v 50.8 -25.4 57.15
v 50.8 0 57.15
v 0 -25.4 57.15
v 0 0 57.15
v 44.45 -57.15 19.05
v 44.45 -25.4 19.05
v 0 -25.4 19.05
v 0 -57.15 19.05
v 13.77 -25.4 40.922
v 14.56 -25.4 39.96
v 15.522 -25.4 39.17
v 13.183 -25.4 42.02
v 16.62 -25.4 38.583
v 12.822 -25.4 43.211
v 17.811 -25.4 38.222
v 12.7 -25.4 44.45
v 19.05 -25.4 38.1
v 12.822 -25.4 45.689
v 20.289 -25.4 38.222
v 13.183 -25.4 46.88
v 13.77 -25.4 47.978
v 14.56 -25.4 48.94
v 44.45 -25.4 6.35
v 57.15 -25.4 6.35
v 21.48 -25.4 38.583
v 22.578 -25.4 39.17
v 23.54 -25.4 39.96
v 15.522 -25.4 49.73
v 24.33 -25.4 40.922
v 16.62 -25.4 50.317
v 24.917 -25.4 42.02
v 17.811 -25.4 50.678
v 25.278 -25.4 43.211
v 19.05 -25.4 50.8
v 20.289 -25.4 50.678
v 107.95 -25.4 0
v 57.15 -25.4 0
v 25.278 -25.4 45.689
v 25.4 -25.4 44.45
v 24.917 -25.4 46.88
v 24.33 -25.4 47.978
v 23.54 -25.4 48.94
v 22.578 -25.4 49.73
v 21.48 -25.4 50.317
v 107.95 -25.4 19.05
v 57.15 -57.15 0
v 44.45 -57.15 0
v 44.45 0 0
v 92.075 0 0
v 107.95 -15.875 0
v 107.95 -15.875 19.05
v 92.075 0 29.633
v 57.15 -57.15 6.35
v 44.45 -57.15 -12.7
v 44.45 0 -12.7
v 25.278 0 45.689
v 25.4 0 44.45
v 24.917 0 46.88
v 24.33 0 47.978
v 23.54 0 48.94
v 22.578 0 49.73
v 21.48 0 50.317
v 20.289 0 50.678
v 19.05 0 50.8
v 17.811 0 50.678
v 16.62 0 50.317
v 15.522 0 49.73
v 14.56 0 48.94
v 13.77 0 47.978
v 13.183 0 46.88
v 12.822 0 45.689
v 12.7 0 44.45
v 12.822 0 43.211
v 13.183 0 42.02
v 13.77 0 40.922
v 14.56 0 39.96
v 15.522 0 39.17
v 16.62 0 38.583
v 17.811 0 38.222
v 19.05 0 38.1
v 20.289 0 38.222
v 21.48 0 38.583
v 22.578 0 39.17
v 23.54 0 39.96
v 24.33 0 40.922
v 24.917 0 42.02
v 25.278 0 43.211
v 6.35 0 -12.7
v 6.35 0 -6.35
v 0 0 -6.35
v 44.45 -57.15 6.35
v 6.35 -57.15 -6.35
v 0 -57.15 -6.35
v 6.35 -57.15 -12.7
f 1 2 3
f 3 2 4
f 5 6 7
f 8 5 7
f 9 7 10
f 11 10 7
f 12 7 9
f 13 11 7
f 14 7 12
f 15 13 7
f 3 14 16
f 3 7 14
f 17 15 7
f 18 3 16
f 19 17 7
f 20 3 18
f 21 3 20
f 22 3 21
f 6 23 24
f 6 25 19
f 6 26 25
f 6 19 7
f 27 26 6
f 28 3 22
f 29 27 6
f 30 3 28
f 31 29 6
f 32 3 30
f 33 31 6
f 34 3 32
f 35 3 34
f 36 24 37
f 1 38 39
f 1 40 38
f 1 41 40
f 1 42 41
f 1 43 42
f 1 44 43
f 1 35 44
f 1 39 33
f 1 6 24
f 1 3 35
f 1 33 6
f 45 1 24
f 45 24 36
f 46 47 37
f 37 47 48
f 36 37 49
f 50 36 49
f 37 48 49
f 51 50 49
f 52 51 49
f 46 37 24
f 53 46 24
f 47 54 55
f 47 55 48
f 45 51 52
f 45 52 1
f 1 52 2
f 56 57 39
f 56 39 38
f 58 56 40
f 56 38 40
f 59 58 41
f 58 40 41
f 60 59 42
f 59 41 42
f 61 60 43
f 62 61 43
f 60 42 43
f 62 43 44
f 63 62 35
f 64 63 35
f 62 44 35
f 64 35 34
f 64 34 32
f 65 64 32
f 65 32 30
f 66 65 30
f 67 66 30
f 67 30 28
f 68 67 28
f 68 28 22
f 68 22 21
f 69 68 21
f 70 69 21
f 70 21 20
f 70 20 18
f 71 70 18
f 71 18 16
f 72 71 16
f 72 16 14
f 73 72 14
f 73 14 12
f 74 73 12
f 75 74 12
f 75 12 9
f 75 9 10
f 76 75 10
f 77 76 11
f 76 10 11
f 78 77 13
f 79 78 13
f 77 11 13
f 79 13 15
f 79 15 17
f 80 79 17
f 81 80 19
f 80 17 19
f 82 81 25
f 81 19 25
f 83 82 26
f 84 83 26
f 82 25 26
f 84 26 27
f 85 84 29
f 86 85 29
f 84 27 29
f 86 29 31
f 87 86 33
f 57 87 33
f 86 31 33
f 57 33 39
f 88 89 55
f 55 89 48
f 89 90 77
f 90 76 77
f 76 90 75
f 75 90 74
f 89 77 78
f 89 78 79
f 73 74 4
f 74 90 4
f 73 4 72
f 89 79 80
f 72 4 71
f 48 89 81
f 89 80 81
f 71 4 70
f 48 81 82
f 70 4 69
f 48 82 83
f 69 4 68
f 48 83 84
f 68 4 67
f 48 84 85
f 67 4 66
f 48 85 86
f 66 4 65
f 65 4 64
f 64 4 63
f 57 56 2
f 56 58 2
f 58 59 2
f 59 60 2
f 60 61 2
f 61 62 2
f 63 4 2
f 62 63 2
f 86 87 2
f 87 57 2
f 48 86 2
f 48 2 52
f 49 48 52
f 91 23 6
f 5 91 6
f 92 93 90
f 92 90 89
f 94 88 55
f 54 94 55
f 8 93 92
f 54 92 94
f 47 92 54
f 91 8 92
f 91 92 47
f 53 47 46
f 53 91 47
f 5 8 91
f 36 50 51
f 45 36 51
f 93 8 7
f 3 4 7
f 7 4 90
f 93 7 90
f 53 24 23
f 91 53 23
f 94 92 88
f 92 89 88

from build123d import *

# Parameters (mm, degrees)
F1_DEPTH      = 25.4
F3_DEPTH      = 25.4
F3_DEPTH_BACK = 31.75
F4_DEPTH      = 31.75
F5_R          = 6.35
F6_DEPTH      = 25.401
F8_DEPTH      = 57.151


with BuildPart() as f1:
    # F0 (on Front) → F1 (new body)
    with BuildSketch(Plane.XZ):
        Polygon((0, 57.15), (0, 0), (107.95, 0), (107.95, 19.05), (50.8, 57.15), align=None)
    extrude(amount=F1_DEPTH)

    # F2 (on face) → F3 (join, two sides)
    with BuildSketch(Plane.XZ.offset(25.4)) as f3_sk:
        Polygon((44.45, 0), (0, 0), (0, -6.35), (6.35, -6.35), (6.35, -12.7), (44.45, -12.7), align=None)
    extrude(amount=-F3_DEPTH)
    extrude(f3_sk.sketch, amount=F3_DEPTH_BACK)

    # F2 (on face) → F4 (join)
    with BuildSketch(Plane.XZ.offset(25.4)):
        Polygon((0, 19.05), (0, 0), (44.45, 0), (57.15, 0), (57.15, 6.35), (44.45, 6.35), (44.45, 19.05), align=None)
    extrude(amount=F4_DEPTH)

    # F5 (on face) → F6 (cut, through all)
    with BuildSketch(Plane.XZ.offset(25.4)):
        with Locations((19.05, 44.45)):
            Circle(F5_R)
    extrude(amount=-F6_DEPTH, mode=Mode.SUBTRACT)

    # F7 (on face) → F8 (cut, through all)
    with BuildSketch(Plane(origin=(0, 0, 0), x_dir=(1, 0, 0), z_dir=(0, 0, -1))):
        Polygon((107.95, 0), (107.95, 15.875), (92.075, 0), align=None)
    extrude(amount=-F8_DEPTH, mode=Mode.SUBTRACT)


solid = f1.part
